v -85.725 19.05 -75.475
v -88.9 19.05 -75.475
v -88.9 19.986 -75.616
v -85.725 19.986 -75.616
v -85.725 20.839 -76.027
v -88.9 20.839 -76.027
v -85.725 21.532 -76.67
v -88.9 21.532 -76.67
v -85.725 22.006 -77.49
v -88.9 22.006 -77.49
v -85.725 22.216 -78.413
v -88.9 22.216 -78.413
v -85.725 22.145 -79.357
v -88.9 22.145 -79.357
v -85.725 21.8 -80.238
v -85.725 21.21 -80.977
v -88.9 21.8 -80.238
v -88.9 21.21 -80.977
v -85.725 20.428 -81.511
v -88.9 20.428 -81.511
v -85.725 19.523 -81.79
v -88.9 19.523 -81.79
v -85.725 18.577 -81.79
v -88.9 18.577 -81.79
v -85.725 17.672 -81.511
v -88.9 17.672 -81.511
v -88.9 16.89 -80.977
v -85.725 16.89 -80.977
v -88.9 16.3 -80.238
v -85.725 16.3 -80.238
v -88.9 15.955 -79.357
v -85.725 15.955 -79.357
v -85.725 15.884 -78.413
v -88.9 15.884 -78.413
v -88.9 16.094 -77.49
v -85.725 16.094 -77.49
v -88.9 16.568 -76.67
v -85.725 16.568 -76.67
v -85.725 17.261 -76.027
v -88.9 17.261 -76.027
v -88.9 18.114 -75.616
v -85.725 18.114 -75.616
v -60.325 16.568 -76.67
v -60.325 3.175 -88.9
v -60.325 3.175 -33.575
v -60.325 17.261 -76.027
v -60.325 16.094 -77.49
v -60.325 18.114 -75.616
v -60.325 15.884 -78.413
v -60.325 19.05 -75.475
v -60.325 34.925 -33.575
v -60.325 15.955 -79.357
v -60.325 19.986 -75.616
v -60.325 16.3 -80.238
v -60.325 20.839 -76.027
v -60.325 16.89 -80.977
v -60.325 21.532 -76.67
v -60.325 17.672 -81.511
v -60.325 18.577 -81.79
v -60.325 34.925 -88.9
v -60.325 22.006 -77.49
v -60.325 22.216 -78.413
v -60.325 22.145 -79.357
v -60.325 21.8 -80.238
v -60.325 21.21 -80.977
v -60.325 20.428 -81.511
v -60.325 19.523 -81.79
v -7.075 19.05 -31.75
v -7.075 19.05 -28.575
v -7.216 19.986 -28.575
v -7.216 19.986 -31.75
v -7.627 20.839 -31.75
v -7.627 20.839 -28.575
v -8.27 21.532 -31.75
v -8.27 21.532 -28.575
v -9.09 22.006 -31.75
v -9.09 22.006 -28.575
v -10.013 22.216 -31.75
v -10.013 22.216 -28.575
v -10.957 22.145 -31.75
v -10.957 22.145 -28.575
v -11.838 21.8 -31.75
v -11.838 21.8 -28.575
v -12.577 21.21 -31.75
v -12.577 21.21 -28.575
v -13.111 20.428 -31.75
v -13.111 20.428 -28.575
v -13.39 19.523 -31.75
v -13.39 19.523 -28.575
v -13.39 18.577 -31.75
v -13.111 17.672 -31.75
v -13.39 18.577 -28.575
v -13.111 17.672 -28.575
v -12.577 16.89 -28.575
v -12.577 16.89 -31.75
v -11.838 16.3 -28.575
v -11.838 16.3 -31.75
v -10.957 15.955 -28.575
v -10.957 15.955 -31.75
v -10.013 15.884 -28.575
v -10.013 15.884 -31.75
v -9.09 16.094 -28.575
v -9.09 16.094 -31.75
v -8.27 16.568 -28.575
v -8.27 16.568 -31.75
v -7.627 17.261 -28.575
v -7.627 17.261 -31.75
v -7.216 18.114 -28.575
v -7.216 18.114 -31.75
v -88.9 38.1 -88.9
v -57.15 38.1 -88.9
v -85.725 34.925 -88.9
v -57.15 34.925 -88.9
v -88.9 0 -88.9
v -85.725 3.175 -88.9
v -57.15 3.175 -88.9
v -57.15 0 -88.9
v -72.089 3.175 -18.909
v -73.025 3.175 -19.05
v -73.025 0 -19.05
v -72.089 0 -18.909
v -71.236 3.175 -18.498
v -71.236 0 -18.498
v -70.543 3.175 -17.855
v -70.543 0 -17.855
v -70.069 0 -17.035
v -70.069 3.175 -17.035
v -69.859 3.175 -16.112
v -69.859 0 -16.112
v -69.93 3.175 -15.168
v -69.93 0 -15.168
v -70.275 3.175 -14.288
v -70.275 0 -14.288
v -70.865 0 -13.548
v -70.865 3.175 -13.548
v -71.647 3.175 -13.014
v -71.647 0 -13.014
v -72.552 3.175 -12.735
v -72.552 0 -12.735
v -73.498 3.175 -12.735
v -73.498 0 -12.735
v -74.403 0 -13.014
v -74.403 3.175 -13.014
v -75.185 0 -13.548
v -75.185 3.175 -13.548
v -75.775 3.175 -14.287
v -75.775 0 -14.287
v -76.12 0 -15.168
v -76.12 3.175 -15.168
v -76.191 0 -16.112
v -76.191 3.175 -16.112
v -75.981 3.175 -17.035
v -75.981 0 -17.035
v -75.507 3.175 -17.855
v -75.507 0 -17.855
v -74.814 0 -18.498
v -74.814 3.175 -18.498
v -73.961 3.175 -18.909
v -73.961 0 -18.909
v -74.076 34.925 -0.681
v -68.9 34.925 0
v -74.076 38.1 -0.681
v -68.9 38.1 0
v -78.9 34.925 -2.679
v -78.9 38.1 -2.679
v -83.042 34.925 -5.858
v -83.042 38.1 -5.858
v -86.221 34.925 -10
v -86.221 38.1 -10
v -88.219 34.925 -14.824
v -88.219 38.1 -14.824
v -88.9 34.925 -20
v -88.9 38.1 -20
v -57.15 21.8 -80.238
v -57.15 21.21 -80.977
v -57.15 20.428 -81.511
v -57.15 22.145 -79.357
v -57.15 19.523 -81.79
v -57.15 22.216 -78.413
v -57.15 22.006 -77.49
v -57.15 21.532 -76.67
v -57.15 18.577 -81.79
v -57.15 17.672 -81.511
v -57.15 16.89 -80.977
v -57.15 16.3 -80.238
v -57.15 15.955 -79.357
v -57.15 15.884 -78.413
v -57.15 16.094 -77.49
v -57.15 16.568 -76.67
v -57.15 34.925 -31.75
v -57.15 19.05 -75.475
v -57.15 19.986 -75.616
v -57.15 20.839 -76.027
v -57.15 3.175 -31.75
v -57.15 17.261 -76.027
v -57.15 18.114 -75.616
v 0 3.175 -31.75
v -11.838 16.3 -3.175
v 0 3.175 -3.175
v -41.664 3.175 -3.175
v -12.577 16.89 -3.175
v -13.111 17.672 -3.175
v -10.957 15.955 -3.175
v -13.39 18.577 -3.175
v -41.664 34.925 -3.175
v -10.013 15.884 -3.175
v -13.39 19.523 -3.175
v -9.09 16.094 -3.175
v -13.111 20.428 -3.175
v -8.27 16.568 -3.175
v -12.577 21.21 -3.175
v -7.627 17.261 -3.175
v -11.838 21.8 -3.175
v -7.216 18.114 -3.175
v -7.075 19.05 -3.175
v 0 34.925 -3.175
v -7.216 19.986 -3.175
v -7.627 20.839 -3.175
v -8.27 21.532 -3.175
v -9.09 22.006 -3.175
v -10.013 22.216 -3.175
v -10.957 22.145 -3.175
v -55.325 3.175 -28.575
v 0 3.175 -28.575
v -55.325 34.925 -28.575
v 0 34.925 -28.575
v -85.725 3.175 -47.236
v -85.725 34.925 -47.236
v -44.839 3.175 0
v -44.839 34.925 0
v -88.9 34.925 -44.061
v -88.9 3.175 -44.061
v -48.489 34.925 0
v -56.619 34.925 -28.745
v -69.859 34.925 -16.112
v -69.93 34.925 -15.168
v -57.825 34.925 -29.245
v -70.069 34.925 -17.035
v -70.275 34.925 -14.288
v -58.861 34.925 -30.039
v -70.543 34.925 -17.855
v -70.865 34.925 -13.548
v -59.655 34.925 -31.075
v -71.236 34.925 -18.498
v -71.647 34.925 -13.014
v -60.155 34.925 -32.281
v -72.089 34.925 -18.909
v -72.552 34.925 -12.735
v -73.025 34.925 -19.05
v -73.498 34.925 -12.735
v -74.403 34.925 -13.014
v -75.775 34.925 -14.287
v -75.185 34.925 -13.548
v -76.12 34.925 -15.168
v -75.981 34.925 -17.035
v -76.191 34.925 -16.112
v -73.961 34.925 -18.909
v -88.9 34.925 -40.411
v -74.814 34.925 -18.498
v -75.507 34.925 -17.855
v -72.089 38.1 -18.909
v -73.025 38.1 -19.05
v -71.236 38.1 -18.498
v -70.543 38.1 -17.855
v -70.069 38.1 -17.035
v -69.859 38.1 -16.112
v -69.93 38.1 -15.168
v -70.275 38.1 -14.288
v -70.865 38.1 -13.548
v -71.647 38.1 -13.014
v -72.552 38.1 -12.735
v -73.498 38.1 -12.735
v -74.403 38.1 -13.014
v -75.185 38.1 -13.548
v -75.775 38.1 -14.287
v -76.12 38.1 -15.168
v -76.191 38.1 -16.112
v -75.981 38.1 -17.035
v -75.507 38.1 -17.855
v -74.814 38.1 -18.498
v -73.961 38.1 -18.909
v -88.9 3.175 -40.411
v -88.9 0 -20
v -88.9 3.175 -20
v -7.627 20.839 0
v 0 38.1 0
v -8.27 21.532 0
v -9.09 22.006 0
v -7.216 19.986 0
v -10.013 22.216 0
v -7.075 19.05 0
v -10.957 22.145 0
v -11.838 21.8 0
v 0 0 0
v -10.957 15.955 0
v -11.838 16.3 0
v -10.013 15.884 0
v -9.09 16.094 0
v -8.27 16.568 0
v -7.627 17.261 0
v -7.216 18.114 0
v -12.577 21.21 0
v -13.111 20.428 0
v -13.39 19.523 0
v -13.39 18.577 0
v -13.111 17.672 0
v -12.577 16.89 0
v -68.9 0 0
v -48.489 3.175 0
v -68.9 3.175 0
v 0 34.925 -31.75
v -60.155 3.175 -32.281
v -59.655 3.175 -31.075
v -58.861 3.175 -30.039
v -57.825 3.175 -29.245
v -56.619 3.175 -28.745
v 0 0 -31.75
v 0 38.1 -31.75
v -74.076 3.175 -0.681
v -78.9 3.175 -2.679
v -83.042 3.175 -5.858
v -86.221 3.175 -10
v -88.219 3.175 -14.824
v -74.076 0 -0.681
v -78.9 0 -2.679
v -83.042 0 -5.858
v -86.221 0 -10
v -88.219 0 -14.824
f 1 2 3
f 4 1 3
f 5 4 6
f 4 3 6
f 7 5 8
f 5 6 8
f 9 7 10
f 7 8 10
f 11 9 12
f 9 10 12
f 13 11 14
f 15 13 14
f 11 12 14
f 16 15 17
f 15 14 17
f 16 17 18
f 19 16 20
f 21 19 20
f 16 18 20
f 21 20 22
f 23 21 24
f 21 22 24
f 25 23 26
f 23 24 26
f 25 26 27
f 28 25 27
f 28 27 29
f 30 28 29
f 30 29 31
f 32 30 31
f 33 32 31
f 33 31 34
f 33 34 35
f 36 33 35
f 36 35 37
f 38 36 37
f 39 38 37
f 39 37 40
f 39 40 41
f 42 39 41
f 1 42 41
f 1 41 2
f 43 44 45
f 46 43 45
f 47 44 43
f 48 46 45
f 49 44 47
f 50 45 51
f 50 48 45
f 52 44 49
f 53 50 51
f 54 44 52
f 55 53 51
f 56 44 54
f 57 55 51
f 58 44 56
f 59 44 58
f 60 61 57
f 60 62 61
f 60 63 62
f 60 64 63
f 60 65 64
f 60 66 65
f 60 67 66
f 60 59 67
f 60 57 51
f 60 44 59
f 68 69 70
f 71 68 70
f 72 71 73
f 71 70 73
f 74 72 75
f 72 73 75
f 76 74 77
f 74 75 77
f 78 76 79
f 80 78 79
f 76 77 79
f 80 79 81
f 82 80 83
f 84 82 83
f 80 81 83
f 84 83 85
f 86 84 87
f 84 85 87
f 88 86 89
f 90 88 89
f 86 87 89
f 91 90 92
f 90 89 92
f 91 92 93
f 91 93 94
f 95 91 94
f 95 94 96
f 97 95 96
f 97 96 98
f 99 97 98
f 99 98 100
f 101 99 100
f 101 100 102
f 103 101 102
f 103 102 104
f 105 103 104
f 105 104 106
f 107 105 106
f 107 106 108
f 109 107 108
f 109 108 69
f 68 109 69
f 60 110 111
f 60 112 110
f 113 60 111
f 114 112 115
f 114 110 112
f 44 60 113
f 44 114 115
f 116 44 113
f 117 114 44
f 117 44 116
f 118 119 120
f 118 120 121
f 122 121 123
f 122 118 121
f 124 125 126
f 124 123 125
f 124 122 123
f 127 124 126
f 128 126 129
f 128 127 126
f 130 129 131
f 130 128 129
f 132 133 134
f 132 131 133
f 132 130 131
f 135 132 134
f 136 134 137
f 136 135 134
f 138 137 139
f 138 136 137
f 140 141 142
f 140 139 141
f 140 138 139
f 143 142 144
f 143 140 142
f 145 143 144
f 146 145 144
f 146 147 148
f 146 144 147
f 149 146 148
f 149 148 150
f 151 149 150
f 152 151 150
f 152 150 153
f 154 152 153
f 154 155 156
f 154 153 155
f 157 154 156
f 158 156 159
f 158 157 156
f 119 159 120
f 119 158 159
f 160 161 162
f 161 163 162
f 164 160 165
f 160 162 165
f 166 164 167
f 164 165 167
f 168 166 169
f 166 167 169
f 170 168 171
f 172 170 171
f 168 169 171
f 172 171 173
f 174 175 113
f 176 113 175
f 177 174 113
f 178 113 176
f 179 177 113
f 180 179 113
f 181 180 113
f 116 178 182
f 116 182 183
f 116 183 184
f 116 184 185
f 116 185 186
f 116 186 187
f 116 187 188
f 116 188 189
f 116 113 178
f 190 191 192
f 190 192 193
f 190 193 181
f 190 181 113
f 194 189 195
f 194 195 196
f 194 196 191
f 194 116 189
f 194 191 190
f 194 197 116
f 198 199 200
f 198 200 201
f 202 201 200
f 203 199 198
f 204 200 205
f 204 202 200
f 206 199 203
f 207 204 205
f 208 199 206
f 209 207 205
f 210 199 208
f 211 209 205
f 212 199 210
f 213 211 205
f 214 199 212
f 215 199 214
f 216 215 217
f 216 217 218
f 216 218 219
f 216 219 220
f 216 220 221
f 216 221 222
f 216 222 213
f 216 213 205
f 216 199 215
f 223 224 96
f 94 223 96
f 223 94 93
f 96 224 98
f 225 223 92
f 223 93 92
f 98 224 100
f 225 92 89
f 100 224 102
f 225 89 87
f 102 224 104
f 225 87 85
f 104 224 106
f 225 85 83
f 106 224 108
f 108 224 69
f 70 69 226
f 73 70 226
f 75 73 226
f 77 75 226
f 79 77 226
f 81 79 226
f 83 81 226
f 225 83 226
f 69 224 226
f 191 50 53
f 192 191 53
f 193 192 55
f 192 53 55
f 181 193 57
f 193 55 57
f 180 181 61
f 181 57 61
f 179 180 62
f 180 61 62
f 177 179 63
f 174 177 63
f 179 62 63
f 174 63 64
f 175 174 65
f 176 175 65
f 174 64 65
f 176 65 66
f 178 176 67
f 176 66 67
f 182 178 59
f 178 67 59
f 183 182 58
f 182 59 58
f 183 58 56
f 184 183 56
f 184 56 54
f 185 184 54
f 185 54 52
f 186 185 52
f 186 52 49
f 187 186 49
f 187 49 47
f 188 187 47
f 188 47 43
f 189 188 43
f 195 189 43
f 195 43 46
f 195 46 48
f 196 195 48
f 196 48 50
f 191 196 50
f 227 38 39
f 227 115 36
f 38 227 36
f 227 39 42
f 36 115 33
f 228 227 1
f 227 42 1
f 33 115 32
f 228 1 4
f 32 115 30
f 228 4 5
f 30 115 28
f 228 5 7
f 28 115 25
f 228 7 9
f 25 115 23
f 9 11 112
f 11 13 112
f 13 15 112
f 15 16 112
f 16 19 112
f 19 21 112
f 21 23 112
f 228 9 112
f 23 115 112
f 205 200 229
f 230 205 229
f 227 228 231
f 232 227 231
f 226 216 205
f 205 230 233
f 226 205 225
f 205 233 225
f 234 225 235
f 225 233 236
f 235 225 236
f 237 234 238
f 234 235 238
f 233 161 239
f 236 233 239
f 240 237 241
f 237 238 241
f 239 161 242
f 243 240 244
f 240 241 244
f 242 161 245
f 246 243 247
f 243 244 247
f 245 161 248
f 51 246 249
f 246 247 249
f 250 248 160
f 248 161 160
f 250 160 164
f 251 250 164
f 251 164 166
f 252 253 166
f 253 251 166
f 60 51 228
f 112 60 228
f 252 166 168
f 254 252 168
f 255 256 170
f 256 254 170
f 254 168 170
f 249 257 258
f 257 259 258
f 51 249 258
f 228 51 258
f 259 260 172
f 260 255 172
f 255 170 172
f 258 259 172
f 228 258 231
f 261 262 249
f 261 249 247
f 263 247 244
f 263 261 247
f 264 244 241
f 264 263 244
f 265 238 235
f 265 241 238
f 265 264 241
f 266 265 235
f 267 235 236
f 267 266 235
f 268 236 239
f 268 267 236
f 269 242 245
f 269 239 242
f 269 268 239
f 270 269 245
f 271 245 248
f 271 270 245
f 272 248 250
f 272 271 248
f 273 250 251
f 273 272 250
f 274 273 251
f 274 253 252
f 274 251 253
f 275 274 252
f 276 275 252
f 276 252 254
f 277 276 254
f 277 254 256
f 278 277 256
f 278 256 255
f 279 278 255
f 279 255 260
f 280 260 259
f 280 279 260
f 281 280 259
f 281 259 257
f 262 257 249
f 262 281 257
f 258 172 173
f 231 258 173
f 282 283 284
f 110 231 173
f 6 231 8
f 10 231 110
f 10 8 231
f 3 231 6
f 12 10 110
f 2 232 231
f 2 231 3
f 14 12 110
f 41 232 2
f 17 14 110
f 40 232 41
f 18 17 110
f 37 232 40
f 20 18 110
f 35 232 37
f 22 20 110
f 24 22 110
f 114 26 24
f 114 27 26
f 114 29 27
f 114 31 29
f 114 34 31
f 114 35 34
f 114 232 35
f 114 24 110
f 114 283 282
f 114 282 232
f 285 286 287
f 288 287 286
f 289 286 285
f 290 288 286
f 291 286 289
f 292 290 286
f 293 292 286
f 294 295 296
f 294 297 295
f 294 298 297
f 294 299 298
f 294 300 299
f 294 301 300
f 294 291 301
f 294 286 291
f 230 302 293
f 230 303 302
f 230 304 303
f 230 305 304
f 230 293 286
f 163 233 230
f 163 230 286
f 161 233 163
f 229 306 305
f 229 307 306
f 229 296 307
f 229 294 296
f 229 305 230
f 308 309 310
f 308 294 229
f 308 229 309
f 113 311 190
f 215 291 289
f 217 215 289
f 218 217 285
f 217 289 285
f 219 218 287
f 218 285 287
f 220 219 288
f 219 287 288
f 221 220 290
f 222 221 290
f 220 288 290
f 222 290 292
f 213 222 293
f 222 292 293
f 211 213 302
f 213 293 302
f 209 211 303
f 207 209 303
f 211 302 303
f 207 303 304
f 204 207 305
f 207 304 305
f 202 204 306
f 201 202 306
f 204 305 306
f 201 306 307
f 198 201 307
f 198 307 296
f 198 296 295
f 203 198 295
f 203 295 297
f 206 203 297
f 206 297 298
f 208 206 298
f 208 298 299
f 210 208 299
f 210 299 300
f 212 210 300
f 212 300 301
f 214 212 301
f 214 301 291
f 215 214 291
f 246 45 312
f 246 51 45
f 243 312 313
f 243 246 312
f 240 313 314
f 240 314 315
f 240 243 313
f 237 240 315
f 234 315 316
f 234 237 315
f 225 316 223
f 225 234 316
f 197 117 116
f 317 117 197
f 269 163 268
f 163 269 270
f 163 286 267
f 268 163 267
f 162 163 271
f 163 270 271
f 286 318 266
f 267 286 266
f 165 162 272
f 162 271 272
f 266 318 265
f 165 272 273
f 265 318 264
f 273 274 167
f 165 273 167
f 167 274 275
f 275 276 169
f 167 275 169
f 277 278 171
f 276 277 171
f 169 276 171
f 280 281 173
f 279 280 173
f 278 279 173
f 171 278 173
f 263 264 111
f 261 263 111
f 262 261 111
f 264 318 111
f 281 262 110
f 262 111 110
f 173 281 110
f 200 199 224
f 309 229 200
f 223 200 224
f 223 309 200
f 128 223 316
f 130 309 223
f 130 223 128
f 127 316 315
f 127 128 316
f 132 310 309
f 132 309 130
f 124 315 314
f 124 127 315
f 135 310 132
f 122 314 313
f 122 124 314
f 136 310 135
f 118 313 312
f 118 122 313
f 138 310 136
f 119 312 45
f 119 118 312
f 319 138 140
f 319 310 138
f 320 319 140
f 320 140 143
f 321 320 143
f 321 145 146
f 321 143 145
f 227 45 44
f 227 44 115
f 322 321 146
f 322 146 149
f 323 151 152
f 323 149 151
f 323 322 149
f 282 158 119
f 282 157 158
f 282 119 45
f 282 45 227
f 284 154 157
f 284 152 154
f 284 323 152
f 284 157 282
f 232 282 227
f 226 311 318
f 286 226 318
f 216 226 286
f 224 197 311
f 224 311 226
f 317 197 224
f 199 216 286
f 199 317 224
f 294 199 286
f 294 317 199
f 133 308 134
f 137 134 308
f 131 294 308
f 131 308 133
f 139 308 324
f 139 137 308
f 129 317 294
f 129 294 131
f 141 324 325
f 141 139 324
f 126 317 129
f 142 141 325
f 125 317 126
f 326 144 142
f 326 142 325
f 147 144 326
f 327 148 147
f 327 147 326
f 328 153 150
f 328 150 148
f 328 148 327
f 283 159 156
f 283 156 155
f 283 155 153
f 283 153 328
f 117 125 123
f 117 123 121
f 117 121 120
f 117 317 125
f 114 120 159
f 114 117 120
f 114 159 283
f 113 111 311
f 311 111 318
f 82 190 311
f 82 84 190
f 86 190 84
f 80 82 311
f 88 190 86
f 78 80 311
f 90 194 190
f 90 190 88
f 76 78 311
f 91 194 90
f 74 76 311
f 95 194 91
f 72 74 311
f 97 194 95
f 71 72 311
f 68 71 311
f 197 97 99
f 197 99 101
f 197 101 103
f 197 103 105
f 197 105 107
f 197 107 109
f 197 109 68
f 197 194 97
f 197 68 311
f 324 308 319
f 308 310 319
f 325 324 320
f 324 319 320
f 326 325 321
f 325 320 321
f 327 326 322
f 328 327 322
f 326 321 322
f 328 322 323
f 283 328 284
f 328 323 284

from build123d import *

# Parameters (mm, degrees)
BOSS_EXTRUDE1_DEPTH     = 38.1
SKETCH2_W               = 25.4
SKETCH2_H               = 31.75
CUT_EXTRUDE1_DEPTH      = 88.9
CUT_EXTRUDE2_REACH      = 133.37
SKETCH3_W               = 25.4
SKETCH3_H               = 31.75
CUT_EXTRUDE3_START      = -62.861793
SKETCH4_W               = 75
SKETCH4_H               = 31.75
CUT_EXTRUDE3_DEPTH      = 28.575
FILLET4_R               = 20
CUT_EXTRUDE8_DEPTH      = 131.484388453
CUT_EXTRUDE8_DEPTH_BACK = 131.484388453
SKETCH8_R               = 3.175
BOSS_EXTRUDE2_DEPTH     = 3.175
CUT_EXTRUDE10_REACH     = 133.37
SKETCH35_R              = 3.175
CUT_EXTRUDE11_REACH     = 133.37
SKETCH36_R              = 3.175
FILLET8_R               = 5
CHAMFER1_SIZE           = 10
CHAMFER1_SIZE_2         = 7.071067812


with BuildPart() as part:
    # Sketch1 → Boss-Extrude1 (new body)
    with BuildSketch(Plane(origin=(0, 0, 0), x_dir=(1, 0, 0), z_dir=(0, 1, 0))):
        Polygon((0, 0), (-88.9, 0), (-88.9, 88.9), (-57.15, 88.9), (-57.15, 31.75), (0, 31.75), align=None)
    extrude(amount=BOSS_EXTRUDE1_DEPTH)

    # Sketch2 → Cut-Extrude1 (cut)
    with BuildSketch(Plane(origin=(0, 0, 0), x_dir=(0, 0, -1), z_dir=(1, 0, 0))):
        with Locations((15.875, 19.05)):
            Rectangle(SKETCH2_W, SKETCH2_H)
    extrude(amount=-CUT_EXTRUDE1_DEPTH, mode=Mode.SUBTRACT)

    # Cut-Extrude2: up to this face of the body (flat: up to its plane)
    cut_extrude2_end = Plane(part.part.faces().sort_by_distance((-44.45, 19.05, 0))[0])
    # Sketch3 → Cut-Extrude2 (cut, up to the picked face)
    with BuildSketch(Plane(origin=(0, 0, -88.9), x_dir=(-1, 0, 0), z_dir=(0, 0, -1)), mode=Mode.PRIVATE) as cut_extrude2_sk1:
        with Locations((73.025, 19.05)):
            Rectangle(SKETCH3_W, SKETCH3_H)
    cut_extrude2_tool1 = split(extrude(cut_extrude2_sk1.sketch, amount=-CUT_EXTRUDE2_REACH, mode=Mode.PRIVATE), bisect_by=cut_extrude2_end, keep=Keep.BOTH, mode=Mode.PRIVATE)
    add(cut_extrude2_tool1.solids().sort_by(Axis((-73.025, 19.05, -88.9), (0, 0, 1)))[0], mode=Mode.SUBTRACT)

    # Sketch4 → Cut-Extrude3 (cut)
    with BuildSketch(Plane(origin=(0, 0, 0), x_dir=(-0.7071067811865475, 0, -0.7071067811865476), z_dir=(0.7071067811865476, 0, -0.7071067811865475)).offset(CUT_EXTRUDE3_START)):
        with Locations((62.861792847, 19.05)):
            Rectangle(SKETCH4_W, SKETCH4_H)
    extrude(amount=CUT_EXTRUDE3_DEPTH, mode=Mode.SUBTRACT)

    # Fillet4
    fillet4_edges = [part.edges().sort_by_distance(p)[0] for p in [
        (-88.9, 36.5125, 0),
        (-88.9, 1.5875, 0),
    ]]
    fillet(fillet4_edges, radius=FILLET4_R)

    # Sketch8 → Cut-Extrude8 (cut, two sides: drawn at the far end of the back side and taken through both)
    with BuildSketch(Plane.XZ.offset(-34.925).offset(-CUT_EXTRUDE8_DEPTH_BACK)):
        with Locations(Location((-73.025, -15.875, 0), (0, 0, 270))):
            Circle(SKETCH8_R)
    extrude(amount=CUT_EXTRUDE8_DEPTH + CUT_EXTRUDE8_DEPTH_BACK, mode=Mode.SUBTRACT)

    # Sketch29 → Boss-Extrude2 (add)
    with BuildSketch(Plane(origin=(0, 38.1, 0), x_dir=(1, 0, 0), z_dir=(0, 1, 0))):
        Polygon((-57.15, 88.9), (0, 31.75), (-57.15, 31.75), align=None)
    boss_extrude2 = extrude(amount=-BOSS_EXTRUDE2_DEPTH)

    # Cut-Extrude10: up to this face of the body (flat: up to its plane)
    cut_extrude10_end = Plane(part.part.faces().sort_by_distance((-57.15, 17.4625, -60.325))[0])
    # Sketch35 → Cut-Extrude10 (cut, up to the picked face)
    with BuildSketch(Plane.ZY.offset(88.9), mode=Mode.PRIVATE) as cut_extrude10_sk1:
        with Locations((-78.65, 19.05)):
            Circle(SKETCH35_R)
    cut_extrude10_tool1 = split(extrude(cut_extrude10_sk1.sketch, amount=-CUT_EXTRUDE10_REACH, mode=Mode.PRIVATE), bisect_by=cut_extrude10_end, keep=Keep.BOTH, mode=Mode.PRIVATE)
    add(cut_extrude10_tool1.solids().sort_by(Axis((-88.9, 19.05, -78.65), (1, 0, 0)))[0], mode=Mode.SUBTRACT)

    # Cut-Extrude11: up to this face of the body (flat: up to its plane)
    cut_extrude11_end = Plane(part.part.faces().sort_by_distance((-28.575, 17.4625, -31.75))[0])
    # Sketch36 → Cut-Extrude11 (cut, up to the picked face)
    with BuildSketch(Plane.XY, mode=Mode.PRIVATE) as cut_extrude11_sk1:
        with Locations((-10.25, 19.05)):
            Circle(SKETCH36_R)
    cut_extrude11_tool1 = split(extrude(cut_extrude11_sk1.sketch, amount=-CUT_EXTRUDE11_REACH, mode=Mode.PRIVATE), bisect_by=cut_extrude11_end, keep=Keep.BOTH, mode=Mode.PRIVATE)
    add(cut_extrude11_tool1.solids().sort_by(Axis((-10.25, 19.05, 0), (0, 0, -1)))[0], mode=Mode.SUBTRACT)

    # Mirror1: Boss-Extrude2 across plane
    add(boss_extrude2.mirror(Plane(origin=(0, 19.05, 0), x_dir=(0, 0, 1), z_dir=(0, -1, 0))))

    # Fillet8
    fillet8_edges = [part.edges().sort_by_distance(p)[0] for p in [
        (-60.325, 19.05, -28.575),
    ]]
    fillet(fillet8_edges, radius=FILLET8_R)

    # Chamfer1
    # the kernel refuses this chamfer: 10, 7.071067812 mm, written as the material it takes off along each edge
    with BuildSketch(Plane(origin=(-51.663847671, 3.175, -3.175), x_dir=(0.9996219169112968, 0, -0.027495876610586317), z_dir=(0, 1, 0)), Plane(origin=(-85.725, 34.925, -37.236152329), x_dir=(0.027495876610586317, 0, -0.9996219169112968), z_dir=(0, -1, 0))) as chamfer1_piece_1:
        Polygon((CHAMFER1_SIZE * 0.999621916911, -CHAMFER1_SIZE * 0.0274958766106), (CHAMFER1_SIZE_2 * 0.687396915252, -CHAMFER1_SIZE_2 * 0.726281956863), (0, 0), align=None)
    extrude(amount=31.75, mode=Mode.SUBTRACT)


solid = part.part
